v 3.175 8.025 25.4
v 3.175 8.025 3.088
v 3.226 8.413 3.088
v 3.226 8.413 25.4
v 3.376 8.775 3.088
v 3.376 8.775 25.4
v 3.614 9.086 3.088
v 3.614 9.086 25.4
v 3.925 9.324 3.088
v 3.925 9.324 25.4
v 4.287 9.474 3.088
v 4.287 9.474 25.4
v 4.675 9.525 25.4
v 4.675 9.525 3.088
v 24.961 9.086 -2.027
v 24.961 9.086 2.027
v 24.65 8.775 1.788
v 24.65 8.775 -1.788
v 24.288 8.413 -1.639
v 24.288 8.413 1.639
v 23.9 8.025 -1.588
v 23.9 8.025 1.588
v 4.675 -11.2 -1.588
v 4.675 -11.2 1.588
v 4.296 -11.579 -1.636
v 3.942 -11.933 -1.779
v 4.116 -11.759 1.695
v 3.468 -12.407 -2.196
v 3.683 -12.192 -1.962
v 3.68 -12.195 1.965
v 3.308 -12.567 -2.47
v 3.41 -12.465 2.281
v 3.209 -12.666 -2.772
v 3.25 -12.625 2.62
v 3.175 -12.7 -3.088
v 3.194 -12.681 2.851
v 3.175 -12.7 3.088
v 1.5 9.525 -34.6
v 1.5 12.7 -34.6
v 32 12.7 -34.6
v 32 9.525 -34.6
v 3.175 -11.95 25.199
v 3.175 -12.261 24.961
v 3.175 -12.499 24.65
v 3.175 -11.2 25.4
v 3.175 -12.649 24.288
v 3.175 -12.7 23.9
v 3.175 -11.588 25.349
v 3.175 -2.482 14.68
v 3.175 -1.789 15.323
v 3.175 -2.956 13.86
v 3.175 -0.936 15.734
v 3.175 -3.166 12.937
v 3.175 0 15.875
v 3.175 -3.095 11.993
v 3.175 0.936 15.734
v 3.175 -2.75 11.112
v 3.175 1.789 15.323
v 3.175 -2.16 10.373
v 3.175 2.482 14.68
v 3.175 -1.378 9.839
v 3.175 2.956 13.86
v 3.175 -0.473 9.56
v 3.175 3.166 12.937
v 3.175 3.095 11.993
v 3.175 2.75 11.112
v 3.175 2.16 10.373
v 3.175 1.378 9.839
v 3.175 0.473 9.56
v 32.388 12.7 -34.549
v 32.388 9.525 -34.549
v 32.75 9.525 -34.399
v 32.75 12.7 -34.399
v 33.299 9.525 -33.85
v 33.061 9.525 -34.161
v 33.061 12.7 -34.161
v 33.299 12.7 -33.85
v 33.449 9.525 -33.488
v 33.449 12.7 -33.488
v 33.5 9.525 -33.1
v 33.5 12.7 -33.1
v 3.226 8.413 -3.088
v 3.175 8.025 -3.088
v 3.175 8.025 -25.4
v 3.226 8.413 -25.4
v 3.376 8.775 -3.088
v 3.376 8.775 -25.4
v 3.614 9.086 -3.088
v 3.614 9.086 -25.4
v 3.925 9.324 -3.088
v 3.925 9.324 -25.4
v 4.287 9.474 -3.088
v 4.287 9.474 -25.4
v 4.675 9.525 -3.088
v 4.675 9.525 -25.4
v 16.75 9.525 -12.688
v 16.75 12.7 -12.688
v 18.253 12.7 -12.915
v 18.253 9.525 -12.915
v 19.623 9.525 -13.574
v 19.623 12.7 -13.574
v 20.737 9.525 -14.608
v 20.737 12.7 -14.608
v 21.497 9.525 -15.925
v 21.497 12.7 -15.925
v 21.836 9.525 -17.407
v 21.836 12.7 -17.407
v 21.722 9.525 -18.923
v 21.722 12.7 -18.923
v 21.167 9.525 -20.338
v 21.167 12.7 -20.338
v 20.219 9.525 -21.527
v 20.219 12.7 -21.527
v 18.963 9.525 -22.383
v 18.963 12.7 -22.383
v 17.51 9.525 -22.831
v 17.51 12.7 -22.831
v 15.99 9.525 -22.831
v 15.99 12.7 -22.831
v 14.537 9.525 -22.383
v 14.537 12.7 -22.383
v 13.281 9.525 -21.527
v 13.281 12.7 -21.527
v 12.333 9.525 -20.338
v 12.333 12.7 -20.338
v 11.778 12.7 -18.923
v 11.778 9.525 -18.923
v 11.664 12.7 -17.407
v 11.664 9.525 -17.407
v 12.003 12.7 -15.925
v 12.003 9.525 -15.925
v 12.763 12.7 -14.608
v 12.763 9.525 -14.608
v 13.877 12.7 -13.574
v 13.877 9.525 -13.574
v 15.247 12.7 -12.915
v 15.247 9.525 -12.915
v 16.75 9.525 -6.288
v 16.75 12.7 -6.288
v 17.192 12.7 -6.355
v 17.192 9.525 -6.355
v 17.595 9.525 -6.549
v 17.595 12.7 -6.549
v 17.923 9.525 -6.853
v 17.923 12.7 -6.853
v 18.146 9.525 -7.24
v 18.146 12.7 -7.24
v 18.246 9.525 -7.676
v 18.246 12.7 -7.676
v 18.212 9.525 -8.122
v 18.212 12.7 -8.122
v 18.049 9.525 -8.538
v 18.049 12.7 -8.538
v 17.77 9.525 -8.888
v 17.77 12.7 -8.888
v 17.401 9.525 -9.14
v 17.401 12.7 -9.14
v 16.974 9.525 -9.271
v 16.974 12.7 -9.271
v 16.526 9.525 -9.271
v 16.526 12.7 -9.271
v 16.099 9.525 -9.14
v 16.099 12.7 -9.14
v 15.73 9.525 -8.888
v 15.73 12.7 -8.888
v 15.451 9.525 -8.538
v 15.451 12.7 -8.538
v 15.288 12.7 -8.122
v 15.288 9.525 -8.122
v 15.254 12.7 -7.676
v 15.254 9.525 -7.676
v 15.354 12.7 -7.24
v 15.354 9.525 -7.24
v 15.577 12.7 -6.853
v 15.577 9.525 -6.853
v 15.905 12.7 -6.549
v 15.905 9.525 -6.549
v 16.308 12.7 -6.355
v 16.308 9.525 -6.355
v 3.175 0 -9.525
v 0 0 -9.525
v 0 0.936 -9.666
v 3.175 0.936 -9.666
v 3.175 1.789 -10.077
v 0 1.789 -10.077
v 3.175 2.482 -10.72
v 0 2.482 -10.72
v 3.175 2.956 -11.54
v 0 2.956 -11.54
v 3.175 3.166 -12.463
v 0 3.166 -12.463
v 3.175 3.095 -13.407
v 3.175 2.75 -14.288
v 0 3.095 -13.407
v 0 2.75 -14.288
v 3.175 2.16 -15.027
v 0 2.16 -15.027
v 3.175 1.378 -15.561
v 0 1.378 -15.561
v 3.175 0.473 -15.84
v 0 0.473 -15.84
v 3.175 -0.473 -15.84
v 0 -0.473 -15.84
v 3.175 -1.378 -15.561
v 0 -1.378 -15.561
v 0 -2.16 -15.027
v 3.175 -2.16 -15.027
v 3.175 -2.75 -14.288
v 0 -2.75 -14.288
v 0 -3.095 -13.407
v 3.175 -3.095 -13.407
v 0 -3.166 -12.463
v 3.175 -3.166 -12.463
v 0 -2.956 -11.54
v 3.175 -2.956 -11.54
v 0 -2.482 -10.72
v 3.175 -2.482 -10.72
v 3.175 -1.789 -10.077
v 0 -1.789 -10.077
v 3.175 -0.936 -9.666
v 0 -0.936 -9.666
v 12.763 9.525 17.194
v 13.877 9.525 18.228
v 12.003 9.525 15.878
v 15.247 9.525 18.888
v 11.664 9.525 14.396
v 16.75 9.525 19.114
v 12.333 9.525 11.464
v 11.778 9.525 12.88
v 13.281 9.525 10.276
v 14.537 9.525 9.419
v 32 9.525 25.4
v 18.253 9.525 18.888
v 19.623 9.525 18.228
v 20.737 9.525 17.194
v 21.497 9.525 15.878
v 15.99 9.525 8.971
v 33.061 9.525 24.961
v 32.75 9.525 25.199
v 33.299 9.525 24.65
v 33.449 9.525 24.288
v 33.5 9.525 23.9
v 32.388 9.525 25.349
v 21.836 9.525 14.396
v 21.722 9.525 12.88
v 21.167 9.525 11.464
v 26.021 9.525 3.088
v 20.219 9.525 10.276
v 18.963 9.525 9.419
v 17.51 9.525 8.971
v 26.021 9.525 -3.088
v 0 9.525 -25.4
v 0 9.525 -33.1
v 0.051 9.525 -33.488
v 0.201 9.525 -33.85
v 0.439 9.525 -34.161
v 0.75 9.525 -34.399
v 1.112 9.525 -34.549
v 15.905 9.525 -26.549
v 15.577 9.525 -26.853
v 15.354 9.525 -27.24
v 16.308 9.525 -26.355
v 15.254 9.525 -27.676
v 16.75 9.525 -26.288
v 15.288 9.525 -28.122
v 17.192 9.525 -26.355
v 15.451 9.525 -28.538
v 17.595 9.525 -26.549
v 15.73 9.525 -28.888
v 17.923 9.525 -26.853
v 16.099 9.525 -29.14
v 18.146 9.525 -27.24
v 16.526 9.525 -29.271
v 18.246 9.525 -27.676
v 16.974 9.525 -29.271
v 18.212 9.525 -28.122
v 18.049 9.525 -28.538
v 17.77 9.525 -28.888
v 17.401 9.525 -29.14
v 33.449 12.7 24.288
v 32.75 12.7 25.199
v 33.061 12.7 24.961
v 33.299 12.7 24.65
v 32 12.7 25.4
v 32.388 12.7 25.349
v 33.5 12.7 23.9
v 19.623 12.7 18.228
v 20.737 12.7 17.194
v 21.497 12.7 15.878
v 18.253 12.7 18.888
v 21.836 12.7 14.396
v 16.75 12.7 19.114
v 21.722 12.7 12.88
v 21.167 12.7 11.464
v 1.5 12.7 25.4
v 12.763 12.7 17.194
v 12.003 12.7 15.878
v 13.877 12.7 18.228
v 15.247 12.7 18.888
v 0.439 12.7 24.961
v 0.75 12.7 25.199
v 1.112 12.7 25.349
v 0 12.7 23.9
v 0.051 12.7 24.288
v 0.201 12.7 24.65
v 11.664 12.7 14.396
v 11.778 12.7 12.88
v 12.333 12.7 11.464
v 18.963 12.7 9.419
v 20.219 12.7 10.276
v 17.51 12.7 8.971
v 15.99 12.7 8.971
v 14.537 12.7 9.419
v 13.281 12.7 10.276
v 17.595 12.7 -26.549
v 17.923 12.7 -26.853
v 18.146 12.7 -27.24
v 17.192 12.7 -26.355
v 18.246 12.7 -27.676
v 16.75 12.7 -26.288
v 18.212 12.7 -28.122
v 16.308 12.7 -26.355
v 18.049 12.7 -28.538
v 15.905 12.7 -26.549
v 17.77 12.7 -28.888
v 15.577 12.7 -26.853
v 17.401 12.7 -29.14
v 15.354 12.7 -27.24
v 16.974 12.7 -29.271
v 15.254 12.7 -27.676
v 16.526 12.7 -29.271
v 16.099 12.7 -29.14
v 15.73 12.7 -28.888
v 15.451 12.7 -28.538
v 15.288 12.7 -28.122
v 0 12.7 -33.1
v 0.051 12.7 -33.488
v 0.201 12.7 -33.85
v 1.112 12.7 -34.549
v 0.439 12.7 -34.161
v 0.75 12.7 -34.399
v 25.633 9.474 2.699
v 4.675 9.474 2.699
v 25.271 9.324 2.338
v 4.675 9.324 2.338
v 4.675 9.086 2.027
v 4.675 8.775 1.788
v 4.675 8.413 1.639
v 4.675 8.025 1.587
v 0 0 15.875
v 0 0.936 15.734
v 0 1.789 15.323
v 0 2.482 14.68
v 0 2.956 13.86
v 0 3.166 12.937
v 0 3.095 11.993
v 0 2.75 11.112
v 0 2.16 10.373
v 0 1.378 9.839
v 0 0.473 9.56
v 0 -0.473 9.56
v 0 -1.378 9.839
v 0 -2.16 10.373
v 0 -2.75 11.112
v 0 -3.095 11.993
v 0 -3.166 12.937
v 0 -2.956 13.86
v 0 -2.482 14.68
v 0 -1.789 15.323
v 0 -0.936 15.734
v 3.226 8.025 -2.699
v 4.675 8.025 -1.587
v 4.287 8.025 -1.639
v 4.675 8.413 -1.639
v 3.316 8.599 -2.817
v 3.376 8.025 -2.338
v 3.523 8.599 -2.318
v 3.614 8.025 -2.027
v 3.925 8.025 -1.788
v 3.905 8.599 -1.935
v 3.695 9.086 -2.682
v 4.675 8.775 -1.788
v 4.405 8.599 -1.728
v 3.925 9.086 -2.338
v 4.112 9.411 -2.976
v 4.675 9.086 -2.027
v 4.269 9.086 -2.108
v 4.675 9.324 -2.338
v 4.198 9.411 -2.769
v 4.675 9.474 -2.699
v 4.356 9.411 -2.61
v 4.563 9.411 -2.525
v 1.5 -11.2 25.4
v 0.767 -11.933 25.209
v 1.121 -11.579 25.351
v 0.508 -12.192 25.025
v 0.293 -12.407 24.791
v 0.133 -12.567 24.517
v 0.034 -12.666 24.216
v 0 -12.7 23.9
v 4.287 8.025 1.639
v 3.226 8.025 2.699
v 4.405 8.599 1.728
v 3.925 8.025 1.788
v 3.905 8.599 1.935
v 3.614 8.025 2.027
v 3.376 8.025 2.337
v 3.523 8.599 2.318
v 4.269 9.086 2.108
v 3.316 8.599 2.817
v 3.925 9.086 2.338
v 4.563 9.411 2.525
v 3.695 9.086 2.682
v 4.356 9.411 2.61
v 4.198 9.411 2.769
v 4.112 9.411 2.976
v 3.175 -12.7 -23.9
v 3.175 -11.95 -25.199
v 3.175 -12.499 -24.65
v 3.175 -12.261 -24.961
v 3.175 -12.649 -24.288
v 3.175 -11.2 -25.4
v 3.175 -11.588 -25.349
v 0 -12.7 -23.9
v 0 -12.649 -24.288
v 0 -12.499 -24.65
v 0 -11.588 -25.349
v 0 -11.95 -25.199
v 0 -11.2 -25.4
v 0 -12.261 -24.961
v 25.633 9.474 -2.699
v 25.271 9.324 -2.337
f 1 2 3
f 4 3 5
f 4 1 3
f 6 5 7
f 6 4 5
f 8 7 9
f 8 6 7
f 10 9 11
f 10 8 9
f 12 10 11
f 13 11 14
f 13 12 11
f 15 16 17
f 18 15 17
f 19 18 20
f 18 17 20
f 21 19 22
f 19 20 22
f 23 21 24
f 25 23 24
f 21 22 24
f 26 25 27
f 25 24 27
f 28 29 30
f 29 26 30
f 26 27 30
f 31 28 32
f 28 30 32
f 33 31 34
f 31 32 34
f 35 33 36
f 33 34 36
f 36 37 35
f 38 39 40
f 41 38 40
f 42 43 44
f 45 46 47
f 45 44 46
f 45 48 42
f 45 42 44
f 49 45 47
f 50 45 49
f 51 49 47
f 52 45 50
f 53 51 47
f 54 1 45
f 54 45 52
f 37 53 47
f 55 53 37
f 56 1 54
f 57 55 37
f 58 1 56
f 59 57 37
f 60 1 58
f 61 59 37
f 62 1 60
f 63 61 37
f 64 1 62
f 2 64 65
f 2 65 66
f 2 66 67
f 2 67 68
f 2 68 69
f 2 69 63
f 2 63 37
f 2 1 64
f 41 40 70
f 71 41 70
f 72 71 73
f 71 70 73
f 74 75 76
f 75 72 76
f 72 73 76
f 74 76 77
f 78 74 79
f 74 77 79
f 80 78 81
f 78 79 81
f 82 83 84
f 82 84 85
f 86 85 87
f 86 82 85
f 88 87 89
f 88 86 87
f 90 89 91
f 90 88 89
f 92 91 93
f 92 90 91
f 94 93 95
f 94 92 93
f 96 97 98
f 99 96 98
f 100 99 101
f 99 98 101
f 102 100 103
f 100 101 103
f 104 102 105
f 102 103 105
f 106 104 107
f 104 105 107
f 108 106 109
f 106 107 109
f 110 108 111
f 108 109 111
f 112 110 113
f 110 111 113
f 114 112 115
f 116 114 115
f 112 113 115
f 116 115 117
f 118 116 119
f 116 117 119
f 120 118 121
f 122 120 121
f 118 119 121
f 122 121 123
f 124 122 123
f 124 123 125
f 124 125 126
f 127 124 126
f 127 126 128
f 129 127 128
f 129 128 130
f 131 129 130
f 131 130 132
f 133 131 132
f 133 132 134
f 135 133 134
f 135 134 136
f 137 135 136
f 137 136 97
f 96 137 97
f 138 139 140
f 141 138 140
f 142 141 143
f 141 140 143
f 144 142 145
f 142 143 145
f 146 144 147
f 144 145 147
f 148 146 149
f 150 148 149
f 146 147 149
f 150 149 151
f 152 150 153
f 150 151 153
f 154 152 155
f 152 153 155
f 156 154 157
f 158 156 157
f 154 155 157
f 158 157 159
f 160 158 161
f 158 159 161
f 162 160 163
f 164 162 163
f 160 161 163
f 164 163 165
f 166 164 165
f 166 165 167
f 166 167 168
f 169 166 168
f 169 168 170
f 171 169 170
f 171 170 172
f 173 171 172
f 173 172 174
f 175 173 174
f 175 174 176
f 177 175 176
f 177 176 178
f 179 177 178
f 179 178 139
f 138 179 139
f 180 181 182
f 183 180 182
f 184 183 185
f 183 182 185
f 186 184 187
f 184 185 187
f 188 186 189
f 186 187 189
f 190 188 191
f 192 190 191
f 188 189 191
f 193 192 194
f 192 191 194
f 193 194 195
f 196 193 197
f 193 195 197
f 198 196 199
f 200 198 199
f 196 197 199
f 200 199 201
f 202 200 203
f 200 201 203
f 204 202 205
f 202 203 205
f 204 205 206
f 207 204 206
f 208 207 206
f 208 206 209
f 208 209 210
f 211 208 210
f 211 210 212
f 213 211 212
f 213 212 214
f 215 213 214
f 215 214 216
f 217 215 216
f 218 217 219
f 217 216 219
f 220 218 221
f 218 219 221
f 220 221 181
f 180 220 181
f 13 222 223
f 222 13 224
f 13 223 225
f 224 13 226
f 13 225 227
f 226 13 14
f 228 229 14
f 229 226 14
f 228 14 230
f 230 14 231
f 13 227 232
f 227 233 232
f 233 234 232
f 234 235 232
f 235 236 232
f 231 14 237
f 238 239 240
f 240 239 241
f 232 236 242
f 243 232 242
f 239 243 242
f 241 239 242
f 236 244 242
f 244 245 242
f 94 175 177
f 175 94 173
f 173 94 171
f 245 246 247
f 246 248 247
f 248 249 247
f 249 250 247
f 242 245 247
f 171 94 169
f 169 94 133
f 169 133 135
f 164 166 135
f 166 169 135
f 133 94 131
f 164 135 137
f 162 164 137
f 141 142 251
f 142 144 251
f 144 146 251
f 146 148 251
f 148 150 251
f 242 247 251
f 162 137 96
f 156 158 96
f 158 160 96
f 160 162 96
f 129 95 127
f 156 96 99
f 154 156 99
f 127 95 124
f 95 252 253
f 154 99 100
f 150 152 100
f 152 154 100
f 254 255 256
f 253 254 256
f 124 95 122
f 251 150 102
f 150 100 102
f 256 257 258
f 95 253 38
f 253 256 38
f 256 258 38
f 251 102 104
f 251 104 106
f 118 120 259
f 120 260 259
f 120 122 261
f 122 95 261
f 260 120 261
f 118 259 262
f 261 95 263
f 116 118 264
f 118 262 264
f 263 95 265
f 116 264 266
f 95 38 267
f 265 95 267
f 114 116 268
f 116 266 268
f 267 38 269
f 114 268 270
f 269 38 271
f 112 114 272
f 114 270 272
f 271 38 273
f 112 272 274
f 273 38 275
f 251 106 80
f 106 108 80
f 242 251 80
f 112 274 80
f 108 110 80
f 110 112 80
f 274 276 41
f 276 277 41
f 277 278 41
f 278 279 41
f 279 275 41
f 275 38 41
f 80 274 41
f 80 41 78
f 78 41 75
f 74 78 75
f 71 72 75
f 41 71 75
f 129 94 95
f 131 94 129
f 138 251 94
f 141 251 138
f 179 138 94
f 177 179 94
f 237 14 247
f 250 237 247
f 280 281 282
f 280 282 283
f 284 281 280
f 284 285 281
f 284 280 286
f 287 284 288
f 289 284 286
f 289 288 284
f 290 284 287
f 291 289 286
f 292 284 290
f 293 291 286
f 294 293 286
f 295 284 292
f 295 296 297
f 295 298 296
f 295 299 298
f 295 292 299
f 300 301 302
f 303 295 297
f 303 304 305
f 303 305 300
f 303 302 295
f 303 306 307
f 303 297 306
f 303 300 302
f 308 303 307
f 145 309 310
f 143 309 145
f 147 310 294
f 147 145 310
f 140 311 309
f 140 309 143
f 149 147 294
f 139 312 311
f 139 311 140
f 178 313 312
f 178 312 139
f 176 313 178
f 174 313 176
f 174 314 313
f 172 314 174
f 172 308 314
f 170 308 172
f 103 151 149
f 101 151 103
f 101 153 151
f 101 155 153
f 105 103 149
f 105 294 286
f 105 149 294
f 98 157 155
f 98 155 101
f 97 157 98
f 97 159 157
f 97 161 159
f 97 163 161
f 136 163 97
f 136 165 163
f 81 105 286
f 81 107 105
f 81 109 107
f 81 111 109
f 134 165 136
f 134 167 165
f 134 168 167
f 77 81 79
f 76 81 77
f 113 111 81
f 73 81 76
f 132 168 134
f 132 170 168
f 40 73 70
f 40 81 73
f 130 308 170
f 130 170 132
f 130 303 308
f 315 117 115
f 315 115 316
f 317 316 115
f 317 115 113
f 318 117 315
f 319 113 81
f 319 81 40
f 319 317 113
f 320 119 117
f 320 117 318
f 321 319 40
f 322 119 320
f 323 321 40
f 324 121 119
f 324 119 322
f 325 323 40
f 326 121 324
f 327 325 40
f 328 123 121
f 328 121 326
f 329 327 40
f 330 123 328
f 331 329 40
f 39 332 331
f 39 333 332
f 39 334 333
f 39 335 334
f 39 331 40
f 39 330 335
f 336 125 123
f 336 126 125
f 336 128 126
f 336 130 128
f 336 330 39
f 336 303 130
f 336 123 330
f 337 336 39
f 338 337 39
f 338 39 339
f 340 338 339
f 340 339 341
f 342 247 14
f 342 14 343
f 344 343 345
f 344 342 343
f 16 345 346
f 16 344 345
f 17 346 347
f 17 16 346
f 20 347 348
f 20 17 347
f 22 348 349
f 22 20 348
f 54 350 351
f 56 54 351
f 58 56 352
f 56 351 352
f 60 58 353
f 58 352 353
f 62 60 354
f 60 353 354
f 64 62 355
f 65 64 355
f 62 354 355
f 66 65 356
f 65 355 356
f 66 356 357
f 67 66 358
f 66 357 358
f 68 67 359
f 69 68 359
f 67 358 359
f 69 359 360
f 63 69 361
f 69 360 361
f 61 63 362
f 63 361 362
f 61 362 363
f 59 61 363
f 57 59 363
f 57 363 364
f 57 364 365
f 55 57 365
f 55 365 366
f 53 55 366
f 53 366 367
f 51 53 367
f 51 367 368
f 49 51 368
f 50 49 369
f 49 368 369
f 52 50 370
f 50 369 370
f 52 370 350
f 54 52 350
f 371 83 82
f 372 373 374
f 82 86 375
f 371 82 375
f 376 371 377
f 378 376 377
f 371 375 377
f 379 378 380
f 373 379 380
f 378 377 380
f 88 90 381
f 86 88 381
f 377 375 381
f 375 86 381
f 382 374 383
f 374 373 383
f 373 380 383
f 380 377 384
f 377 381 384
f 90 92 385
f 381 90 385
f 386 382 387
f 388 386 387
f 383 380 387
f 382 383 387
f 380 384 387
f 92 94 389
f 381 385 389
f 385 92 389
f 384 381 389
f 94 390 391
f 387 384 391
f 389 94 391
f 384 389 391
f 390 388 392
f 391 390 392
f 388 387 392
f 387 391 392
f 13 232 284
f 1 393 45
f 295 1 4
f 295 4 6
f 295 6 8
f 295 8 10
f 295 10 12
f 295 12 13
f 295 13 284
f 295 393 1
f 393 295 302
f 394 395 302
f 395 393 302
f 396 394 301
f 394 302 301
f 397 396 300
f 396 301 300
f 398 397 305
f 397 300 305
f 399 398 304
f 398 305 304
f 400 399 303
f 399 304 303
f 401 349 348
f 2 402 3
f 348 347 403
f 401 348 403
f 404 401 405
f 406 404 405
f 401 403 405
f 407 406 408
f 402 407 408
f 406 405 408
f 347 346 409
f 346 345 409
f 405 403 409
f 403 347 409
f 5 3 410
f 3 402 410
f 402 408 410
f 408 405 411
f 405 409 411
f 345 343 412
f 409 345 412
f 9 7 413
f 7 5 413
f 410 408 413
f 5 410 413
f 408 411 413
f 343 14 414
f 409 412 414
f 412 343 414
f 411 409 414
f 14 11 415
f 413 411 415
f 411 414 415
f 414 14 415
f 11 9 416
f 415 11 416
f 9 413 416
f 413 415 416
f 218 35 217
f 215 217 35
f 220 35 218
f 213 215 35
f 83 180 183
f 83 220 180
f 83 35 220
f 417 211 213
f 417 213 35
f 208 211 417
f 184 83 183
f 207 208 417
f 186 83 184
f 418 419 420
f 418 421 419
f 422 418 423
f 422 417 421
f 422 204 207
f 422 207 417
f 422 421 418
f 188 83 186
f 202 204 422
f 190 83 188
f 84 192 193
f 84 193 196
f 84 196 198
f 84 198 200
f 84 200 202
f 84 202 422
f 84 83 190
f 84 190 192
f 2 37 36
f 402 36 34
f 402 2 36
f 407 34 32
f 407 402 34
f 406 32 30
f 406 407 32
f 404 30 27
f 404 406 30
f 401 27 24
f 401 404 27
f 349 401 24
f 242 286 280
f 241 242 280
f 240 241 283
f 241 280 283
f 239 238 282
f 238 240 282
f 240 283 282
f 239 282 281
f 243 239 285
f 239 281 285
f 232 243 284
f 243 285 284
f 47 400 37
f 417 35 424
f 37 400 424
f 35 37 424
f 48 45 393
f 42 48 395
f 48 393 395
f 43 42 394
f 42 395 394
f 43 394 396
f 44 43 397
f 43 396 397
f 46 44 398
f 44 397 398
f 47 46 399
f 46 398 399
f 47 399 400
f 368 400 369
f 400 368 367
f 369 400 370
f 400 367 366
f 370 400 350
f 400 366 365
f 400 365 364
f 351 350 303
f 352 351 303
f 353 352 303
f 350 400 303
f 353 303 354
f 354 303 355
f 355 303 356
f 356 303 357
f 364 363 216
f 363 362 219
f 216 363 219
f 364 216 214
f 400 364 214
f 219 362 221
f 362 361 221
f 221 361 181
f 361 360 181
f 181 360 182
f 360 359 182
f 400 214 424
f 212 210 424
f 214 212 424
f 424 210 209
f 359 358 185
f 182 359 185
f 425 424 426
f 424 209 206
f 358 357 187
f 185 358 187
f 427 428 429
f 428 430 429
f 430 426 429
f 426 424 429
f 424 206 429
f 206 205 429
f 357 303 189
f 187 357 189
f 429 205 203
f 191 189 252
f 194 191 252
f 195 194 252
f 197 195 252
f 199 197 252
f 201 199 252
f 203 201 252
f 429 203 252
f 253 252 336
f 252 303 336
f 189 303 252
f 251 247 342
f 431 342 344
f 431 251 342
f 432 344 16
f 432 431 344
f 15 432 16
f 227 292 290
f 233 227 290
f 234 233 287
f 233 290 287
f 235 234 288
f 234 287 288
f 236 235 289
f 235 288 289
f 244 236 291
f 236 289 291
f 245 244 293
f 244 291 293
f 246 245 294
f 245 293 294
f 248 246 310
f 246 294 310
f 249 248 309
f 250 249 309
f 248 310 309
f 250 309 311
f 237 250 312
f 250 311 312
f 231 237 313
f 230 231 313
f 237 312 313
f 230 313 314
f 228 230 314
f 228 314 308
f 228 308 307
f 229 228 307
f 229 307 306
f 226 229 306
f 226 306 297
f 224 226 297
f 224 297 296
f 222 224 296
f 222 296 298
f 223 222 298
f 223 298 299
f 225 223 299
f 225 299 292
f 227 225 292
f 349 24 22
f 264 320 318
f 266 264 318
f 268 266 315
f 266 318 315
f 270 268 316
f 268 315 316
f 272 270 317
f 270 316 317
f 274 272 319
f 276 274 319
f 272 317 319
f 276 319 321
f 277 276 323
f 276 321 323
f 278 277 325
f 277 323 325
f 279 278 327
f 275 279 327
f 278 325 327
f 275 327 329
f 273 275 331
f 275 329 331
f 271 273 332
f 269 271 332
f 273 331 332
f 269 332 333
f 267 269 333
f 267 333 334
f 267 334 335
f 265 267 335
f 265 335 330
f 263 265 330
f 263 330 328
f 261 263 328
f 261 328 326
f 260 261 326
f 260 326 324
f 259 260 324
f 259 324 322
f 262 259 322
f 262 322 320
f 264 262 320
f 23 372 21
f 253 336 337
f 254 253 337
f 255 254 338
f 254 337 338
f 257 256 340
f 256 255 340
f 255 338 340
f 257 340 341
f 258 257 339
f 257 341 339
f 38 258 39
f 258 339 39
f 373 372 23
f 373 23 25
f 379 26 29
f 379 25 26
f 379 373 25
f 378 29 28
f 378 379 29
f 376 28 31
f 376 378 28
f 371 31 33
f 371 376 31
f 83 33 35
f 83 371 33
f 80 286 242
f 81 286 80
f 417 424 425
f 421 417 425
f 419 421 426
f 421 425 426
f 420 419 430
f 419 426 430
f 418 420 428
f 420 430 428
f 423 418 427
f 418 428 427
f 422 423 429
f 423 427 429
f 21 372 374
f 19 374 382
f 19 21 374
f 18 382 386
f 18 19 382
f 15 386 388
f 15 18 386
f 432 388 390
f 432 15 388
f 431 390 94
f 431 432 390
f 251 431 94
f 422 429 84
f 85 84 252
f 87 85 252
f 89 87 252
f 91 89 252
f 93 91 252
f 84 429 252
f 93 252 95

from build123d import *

# Parameters (mm, degrees)
SKETCH2_W           = 50.8
SKETCH2_H           = 25.4
BOSS_EXTRUDE1_DEPTH = 3.175
SKETCH4_W           = 33.5
SKETCH4_H           = 60
BOSS_EXTRUDE2_DEPTH = 3.175
SKETCH6_R           = 3.175
CUT_EXTRUDE2_DEPTH  = 3.175
BOSS_EXTRUDE3_DEPTH = 1.5875
SKETCH8_R           = 5.1
SKETCH8_R_2         = 1.5
CUT_EXTRUDE3_DEPTH  = 10
FILLET3_R           = 1.5


with BuildPart() as part:
    # Sketch2 → Boss-Extrude1 (new body)
    with BuildSketch(Plane(origin=(0, 0, 0), x_dir=(0, 0, -1), z_dir=(1, 0, 0))):
        Rectangle(SKETCH2_W, SKETCH2_H)
    extrude(amount=BOSS_EXTRUDE1_DEPTH)

    # Sketch4 → Boss-Extrude2 (add)
    with BuildSketch(Plane(origin=(0, 12.7, 0), x_dir=(1, 0, 0), z_dir=(0, 1, 0))):
        with Locations((16.75, 4.6)):
            Rectangle(SKETCH4_W, SKETCH4_H)
    extrude(amount=-BOSS_EXTRUDE2_DEPTH)

    # Sketch6 → Cut-Extrude2 (cut)
    with BuildSketch(Plane.ZY):
        with Locations((-12.7, 0)):
            Circle(SKETCH6_R)
        with Locations((12.7, 0)):
            Circle(SKETCH6_R)
    extrude(amount=-CUT_EXTRUDE2_DEPTH, mode=Mode.SUBTRACT)

    # Sketch7 → Boss-Extrude3 (add, symmetric)
    with BuildSketch(Plane.XY):
        Polygon((3.175, -12.7), (25.4, 9.525), (3.175, 9.525), align=None)
    extrude(amount=BOSS_EXTRUDE3_DEPTH, both=True)

    # Sketch8 → Cut-Extrude3 (cut)
    with BuildSketch(Plane(origin=(0, 12.7, 0), x_dir=(1, 0, 0), z_dir=(0, 1, 0))):
        with Locations(Location((16.75, 17.788109286, 0), (0, 0, 270))):
            Circle(SKETCH8_R)
        with Locations(Location((16.75, 7.788109286, 0), (0, 0, 270))):
            Circle(SKETCH8_R_2)
        with Locations(Location((16.75, 27.788109286, 0), (0, 0, 270))):
            Circle(SKETCH8_R_2)
        with Locations(Location((16.75, -14.014379277, 0), (0, 0, 270))):
            Circle(SKETCH8_R)
    extrude(amount=-CUT_EXTRUDE3_DEPTH, mode=Mode.SUBTRACT)

    # Fillet3
    # the kernel refuses this fillet: 1.5 mm, written as the material it adds along each edge
    with BuildSketch(Plane(origin=(4.675, 8.025, 3.0875), x_dir=(-1, 0, 0), z_dir=(0, 1, 0))) as fillet3_piece_1_section:
        Polygon((0, 0), (FILLET3_R, 0), (FILLET3_R, -FILLET3_R), (0, -FILLET3_R), align=None)
    fillet3_piece_1 = extrude(amount=FILLET3_R, mode=Mode.PRIVATE)
    fillet3_piece_1 = fillet3_piece_1 - Plane(origin=(4.675, 8.025, 3.0875), x_dir=(0.7071067811865475, 0, 0.7071067811865475), z_dir=(0, 1, 0)) * Sphere(FILLET3_R, mode=Mode.PRIVATE)
    add(fillet3_piece_1)
    with BuildSketch(Plane(origin=(4.675, 8.025, -3.0875), x_dir=(-1, 0, 0), z_dir=(0, 1, 0))) as fillet3_piece_2_section:
        Polygon((0, 0), (FILLET3_R, 0), (FILLET3_R, FILLET3_R), (0, FILLET3_R), align=None)
    fillet3_piece_2 = extrude(amount=FILLET3_R, mode=Mode.PRIVATE)
    fillet3_piece_2 = fillet3_piece_2 - Plane(origin=(4.675, 8.025, -3.0875), x_dir=(0.7071067811865475, 0, -0.7071067811865475), z_dir=(0, 1, 0)) * Sphere(FILLET3_R, mode=Mode.PRIVATE)
    add(fillet3_piece_2)
    with BuildSketch(Plane(origin=(3.175, 9.525, 25.4), x_dir=(0, -1, 0), z_dir=(0, 0, -1)), Plane(origin=(3.175, 9.525, -3.0875), x_dir=(0, -1, 0), z_dir=(0, 0, -1))) as fillet3_piece_3:
        with BuildLine():
            CenterArc((FILLET3_R, -FILLET3_R), FILLET3_R, 90, 90)
            Line((0, -FILLET3_R), (0, 0))
            Line((0, 0), (FILLET3_R, 0))
        make_face()
    extrude(amount=22.3125)
    with BuildSketch(Plane(origin=(29.15, 9.525, -1.5875), x_dir=(0, 0, -1), z_dir=(-1, 0, 0))) as fillet3_piece_4_section:
        with BuildLine():
            CenterArc((FILLET3_R, FILLET3_R), FILLET3_R, 180, 90)
            Line((0, FILLET3_R), (0, 0))
            Line((0, 0), (FILLET3_R, 0))
        make_face()
    fillet3_piece_4 = extrude(amount=24.475, mode=Mode.PRIVATE)
    fillet3_piece_4 = split(fillet3_piece_4, bisect_by=Plane(origin=(19.967902823, 4.092902823, -1.930123153), z_dir=(-0.707106781186549, 0.707106781186546, 0)), keep=Keep.TOP, mode=Mode.PRIVATE)
    add(fillet3_piece_4)
    with BuildSketch(Plane(origin=(25.4, 9.525, -1.5875), x_dir=(-0.7071067811865489, -0.7071067811865461, 0), z_dir=(0, 0, 1))) as fillet3_piece_5:
        with BuildLine():
            CenterArc((FILLET3_R * 0.414213562373, FILLET3_R), FILLET3_R, 225, 45)
            Line((-FILLET3_R * 0.292893218813, FILLET3_R * 0.292893218813), (0, 0))
            Line((0, 0), (FILLET3_R * 0.414213562373, 0))
        make_face()
    extrude(amount=3.175)
    with BuildSketch(Plane(origin=(3.175, 8.025, -1.5875), x_dir=(0, 0, -1), z_dir=(0, -1, 0))) as fillet3_piece_6_section:
        with BuildLine():
            CenterArc((FILLET3_R, FILLET3_R), FILLET3_R, 180, 90)
            Line((0, FILLET3_R), (0, 0))
            Line((0, 0), (FILLET3_R, 0))
        make_face()
    fillet3_piece_6 = extrude(amount=20.725, mode=Mode.PRIVATE)
    fillet3_piece_6 = split(fillet3_piece_6, bisect_by=Plane(origin=(8.60741784, -7.26758216, -1.930100054), z_dir=(-0.707106781186549, 0.707106781186546, 0)), keep=Keep.TOP, mode=Mode.PRIVATE)
    add(fillet3_piece_6)
    with BuildSketch(Plane(origin=(29.15, 9.525, 1.5875), x_dir=(0, 0, 1), z_dir=(-1, 0, 0))) as fillet3_piece_7_section:
        with BuildLine():
            CenterArc((FILLET3_R, -FILLET3_R), FILLET3_R, 90, 90)
            Line((0, -FILLET3_R), (0, 0))
            Line((0, 0), (FILLET3_R, 0))
        make_face()
    fillet3_piece_7 = extrude(amount=24.475, mode=Mode.PRIVATE)
    fillet3_piece_7 = split(fillet3_piece_7, bisect_by=Plane(origin=(19.967902823, 4.092902823, 1.930123153), z_dir=(-0.707106781186549, 0.707106781186546, 0)), keep=Keep.TOP, mode=Mode.PRIVATE)
    add(fillet3_piece_7)
    with BuildSketch(Plane(origin=(3.175, 8.025, 1.5875), x_dir=(0, 0, 1), z_dir=(0, -1, 0))) as fillet3_piece_8_section:
        with BuildLine():
            CenterArc((FILLET3_R, -FILLET3_R), FILLET3_R, 90, 90)
            Line((0, -FILLET3_R), (0, 0))
            Line((0, 0), (FILLET3_R, 0))
        make_face()
    fillet3_piece_8 = extrude(amount=20.725, mode=Mode.PRIVATE)
    fillet3_piece_8 = split(fillet3_piece_8, bisect_by=Plane(origin=(8.60741784, -7.26758216, 1.930100054), z_dir=(-0.707106781186549, 0.707106781186546, 0)), keep=Keep.TOP, mode=Mode.PRIVATE)
    add(fillet3_piece_8)
    with BuildSketch(Plane(origin=(25.4, 9.525, -3.140800859), x_dir=(-0.7071067811865446, -0.7071067811865503, 0), z_dir=(0, 0, 1))) as fillet3_piece_9a_section:
        with BuildLine():
            CenterArc((FILLET3_R * 0.414213562373, FILLET3_R), FILLET3_R, 225, 45)
            Line((-FILLET3_R * 0.292893218813, FILLET3_R * 0.292893218813), (0, 0))
            Line((0, 0), (FILLET3_R * 0.414213562373, 0))
        make_face()
    fillet3_piece_9a = extrude(amount=4.728300859, mode=Mode.PRIVATE)
    fillet3_piece_9a = split(fillet3_piece_9a, bisect_by=Plane(origin=(25.438403899, 9.432284787, -1.5875), z_dir=(0, 0, -1)), keep=Keep.TOP, mode=Mode.PRIVATE)
    with BuildSketch(Plane(origin=(29.15, 9.525, -1.5875), x_dir=(0, 0, -1), z_dir=(-1, 0, 0))) as fillet3_piece_9b_section:
        with BuildLine():
            CenterArc((FILLET3_R, FILLET3_R), FILLET3_R, 180, 90)
            Line((0, FILLET3_R), (0, 0))
            Line((0, 0), (FILLET3_R, 0))
        make_face()
    fillet3_piece_9b = extrude(amount=24.475, mode=Mode.PRIVATE)
    fillet3_piece_9b = split(fillet3_piece_9b, bisect_by=Plane(origin=(26.063627713, 10.188627713, -1.91198662), z_dir=(0.707106781186549, -0.707106781186546, 0)), keep=Keep.TOP, mode=Mode.PRIVATE)
    fillet3_piece_9 = fillet3_piece_9a & fillet3_piece_9b
    add(fillet3_piece_9)
    with BuildSketch(Plane(origin=(25.4, 9.525, -1.5875), x_dir=(-0.7071067811865489, -0.7071067811865461, 0), z_dir=(0, 0, 1))) as fillet3_piece_10a_section:
        with BuildLine():
            CenterArc((FILLET3_R * 0.414213562373, FILLET3_R), FILLET3_R, 225, 45)
            Line((-FILLET3_R * 0.292893218813, FILLET3_R * 0.292893218813), (0, 0))
            Line((0, 0), (FILLET3_R * 0.414213562373, 0))
        make_face()
    fillet3_piece_10a = extrude(amount=4.728300859, mode=Mode.PRIVATE)
    fillet3_piece_10a = split(fillet3_piece_10a, bisect_by=Plane(origin=(25.438403899, 9.432284787, 1.5875), z_dir=(0, 0, 1)), keep=Keep.TOP, mode=Mode.PRIVATE)
    with BuildSketch(Plane(origin=(29.15, 9.525, 1.5875), x_dir=(0, 0, 1), z_dir=(-1, 0, 0))) as fillet3_piece_10b_section:
        with BuildLine():
            CenterArc((FILLET3_R, -FILLET3_R), FILLET3_R, 90, 90)
            Line((0, -FILLET3_R), (0, 0))
            Line((0, 0), (FILLET3_R, 0))
        make_face()
    fillet3_piece_10b = extrude(amount=24.475, mode=Mode.PRIVATE)
    fillet3_piece_10b = split(fillet3_piece_10b, bisect_by=Plane(origin=(26.063627713, 10.188627713, 1.91198662), z_dir=(0.707106781186549, -0.707106781186546, 0)), keep=Keep.TOP, mode=Mode.PRIVATE)
    fillet3_piece_10 = fillet3_piece_10a & fillet3_piece_10b
    add(fillet3_piece_10)
    # the kernel refuses this fillet: 1.5 mm, written as the material it takes off along each edge
    with BuildSketch(Plane(origin=(33.5, 16.45, 25.4), x_dir=(0, 0, -1), z_dir=(0, -1, 0)), Plane(origin=(0, 16.45, -34.6), x_dir=(0, 0, 1), z_dir=(0, -1, 0)), Plane(origin=(33.5, 16.45, -34.6), x_dir=(-1, 0, 0), z_dir=(0, -1, 0)), Plane(origin=(-3.75, -12.7, -25.4), x_dir=(0, 0, 1), z_dir=(1, 0, 0))) as fillet3_2_piece_1:
        with BuildLine():
            CenterArc((FILLET3_R, -FILLET3_R), FILLET3_R, 90, 90)
            Line((0, -FILLET3_R), (0, 0))
            Line((0, 0), (FILLET3_R, 0))
        make_face()
    extrude(amount=10.675, mode=Mode.SUBTRACT)
    with BuildSketch(Plane(origin=(0, 16.45, 25.4), x_dir=(0, 0, -1), z_dir=(0, -1, 0))) as fillet3_2_piece_2:
        with BuildLine():
            CenterArc((FILLET3_R, FILLET3_R), FILLET3_R, 180, 90)
            Line((0, FILLET3_R), (0, 0))
            Line((0, 0), (FILLET3_R, 0))
        make_face()
    extrude(amount=32.9, mode=Mode.SUBTRACT)
    with BuildSketch(Plane(origin=(-3.75, -12.7, 25.4), x_dir=(0, 0, -1), z_dir=(1, 0, 0))) as fillet3_2_piece_3:
        with BuildLine():
            CenterArc((FILLET3_R, FILLET3_R), FILLET3_R, 180, 90)
            Line((0, FILLET3_R), (0, 0))
            Line((0, 0), (FILLET3_R, 0))
        make_face()
    extrude(amount=10.675, mode=Mode.SUBTRACT)


solid = part.part
